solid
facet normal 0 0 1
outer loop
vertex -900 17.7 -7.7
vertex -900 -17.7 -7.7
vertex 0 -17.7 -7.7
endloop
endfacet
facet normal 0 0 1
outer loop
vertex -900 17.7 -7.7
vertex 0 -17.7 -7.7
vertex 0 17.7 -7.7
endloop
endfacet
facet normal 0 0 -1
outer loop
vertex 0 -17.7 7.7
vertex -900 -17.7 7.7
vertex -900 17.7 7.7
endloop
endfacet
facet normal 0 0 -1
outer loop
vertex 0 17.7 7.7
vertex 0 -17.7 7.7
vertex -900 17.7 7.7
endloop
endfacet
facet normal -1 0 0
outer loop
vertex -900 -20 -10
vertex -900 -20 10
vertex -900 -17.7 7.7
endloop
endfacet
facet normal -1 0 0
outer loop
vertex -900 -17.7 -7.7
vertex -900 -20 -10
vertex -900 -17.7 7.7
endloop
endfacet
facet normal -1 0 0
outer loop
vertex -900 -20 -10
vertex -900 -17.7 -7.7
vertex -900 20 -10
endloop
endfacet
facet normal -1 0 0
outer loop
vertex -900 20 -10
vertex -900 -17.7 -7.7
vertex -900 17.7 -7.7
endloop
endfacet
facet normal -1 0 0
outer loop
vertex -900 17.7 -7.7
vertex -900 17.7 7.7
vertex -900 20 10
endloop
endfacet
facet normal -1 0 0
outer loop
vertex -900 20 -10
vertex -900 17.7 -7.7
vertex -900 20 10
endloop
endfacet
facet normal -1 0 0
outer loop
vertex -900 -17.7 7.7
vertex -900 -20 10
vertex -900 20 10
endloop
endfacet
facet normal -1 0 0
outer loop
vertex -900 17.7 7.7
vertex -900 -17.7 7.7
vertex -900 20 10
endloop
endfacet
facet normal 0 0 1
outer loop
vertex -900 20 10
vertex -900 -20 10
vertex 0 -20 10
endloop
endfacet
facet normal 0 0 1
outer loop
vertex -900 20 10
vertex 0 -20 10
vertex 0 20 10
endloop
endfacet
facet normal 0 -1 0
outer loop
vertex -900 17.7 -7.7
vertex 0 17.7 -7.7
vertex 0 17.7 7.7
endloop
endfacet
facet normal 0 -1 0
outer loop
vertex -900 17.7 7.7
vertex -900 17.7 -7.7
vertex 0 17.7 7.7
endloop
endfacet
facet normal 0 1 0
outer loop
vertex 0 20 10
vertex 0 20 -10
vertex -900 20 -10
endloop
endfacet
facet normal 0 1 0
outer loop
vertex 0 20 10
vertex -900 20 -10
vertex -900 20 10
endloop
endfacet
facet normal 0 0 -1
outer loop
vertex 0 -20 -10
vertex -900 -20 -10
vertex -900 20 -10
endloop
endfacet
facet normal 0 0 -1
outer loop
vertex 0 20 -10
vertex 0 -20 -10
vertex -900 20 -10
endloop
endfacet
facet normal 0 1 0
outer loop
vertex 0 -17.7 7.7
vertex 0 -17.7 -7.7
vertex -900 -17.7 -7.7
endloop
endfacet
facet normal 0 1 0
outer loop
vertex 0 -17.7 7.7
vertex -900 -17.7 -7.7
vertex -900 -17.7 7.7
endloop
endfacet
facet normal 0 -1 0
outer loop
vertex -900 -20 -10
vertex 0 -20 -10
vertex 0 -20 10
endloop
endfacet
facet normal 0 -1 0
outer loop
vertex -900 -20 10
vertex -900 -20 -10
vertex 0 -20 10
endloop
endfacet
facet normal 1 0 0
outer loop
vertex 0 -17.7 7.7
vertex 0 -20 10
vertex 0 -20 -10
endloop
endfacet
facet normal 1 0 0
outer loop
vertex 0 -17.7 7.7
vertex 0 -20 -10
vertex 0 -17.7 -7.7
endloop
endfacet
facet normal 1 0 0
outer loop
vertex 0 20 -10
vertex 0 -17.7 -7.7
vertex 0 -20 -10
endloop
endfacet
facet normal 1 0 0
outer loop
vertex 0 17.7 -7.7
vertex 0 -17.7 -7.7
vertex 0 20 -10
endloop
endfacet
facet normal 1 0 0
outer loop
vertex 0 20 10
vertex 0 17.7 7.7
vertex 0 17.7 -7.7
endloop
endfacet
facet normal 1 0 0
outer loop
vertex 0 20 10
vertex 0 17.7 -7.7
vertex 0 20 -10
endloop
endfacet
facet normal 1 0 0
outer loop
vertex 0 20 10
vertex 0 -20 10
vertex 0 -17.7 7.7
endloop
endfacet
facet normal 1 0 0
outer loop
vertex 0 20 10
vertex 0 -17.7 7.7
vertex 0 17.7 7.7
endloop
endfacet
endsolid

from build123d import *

# Parameters (mm, degrees)
F0_W     = 40
F0_H     = 20
F0_W_2   = 35.4
F0_H_2   = 15.4
F1_DEPTH = 900


with BuildPart() as f1:
    # F0 (on Right) → F1 (new body)
    with BuildSketch(Plane.YZ):
        Rectangle(F0_W, F0_H)
        Rectangle(F0_W_2, F0_H_2, mode=Mode.SUBTRACT)
    extrude(amount=-F1_DEPTH)


solid = f1.part
